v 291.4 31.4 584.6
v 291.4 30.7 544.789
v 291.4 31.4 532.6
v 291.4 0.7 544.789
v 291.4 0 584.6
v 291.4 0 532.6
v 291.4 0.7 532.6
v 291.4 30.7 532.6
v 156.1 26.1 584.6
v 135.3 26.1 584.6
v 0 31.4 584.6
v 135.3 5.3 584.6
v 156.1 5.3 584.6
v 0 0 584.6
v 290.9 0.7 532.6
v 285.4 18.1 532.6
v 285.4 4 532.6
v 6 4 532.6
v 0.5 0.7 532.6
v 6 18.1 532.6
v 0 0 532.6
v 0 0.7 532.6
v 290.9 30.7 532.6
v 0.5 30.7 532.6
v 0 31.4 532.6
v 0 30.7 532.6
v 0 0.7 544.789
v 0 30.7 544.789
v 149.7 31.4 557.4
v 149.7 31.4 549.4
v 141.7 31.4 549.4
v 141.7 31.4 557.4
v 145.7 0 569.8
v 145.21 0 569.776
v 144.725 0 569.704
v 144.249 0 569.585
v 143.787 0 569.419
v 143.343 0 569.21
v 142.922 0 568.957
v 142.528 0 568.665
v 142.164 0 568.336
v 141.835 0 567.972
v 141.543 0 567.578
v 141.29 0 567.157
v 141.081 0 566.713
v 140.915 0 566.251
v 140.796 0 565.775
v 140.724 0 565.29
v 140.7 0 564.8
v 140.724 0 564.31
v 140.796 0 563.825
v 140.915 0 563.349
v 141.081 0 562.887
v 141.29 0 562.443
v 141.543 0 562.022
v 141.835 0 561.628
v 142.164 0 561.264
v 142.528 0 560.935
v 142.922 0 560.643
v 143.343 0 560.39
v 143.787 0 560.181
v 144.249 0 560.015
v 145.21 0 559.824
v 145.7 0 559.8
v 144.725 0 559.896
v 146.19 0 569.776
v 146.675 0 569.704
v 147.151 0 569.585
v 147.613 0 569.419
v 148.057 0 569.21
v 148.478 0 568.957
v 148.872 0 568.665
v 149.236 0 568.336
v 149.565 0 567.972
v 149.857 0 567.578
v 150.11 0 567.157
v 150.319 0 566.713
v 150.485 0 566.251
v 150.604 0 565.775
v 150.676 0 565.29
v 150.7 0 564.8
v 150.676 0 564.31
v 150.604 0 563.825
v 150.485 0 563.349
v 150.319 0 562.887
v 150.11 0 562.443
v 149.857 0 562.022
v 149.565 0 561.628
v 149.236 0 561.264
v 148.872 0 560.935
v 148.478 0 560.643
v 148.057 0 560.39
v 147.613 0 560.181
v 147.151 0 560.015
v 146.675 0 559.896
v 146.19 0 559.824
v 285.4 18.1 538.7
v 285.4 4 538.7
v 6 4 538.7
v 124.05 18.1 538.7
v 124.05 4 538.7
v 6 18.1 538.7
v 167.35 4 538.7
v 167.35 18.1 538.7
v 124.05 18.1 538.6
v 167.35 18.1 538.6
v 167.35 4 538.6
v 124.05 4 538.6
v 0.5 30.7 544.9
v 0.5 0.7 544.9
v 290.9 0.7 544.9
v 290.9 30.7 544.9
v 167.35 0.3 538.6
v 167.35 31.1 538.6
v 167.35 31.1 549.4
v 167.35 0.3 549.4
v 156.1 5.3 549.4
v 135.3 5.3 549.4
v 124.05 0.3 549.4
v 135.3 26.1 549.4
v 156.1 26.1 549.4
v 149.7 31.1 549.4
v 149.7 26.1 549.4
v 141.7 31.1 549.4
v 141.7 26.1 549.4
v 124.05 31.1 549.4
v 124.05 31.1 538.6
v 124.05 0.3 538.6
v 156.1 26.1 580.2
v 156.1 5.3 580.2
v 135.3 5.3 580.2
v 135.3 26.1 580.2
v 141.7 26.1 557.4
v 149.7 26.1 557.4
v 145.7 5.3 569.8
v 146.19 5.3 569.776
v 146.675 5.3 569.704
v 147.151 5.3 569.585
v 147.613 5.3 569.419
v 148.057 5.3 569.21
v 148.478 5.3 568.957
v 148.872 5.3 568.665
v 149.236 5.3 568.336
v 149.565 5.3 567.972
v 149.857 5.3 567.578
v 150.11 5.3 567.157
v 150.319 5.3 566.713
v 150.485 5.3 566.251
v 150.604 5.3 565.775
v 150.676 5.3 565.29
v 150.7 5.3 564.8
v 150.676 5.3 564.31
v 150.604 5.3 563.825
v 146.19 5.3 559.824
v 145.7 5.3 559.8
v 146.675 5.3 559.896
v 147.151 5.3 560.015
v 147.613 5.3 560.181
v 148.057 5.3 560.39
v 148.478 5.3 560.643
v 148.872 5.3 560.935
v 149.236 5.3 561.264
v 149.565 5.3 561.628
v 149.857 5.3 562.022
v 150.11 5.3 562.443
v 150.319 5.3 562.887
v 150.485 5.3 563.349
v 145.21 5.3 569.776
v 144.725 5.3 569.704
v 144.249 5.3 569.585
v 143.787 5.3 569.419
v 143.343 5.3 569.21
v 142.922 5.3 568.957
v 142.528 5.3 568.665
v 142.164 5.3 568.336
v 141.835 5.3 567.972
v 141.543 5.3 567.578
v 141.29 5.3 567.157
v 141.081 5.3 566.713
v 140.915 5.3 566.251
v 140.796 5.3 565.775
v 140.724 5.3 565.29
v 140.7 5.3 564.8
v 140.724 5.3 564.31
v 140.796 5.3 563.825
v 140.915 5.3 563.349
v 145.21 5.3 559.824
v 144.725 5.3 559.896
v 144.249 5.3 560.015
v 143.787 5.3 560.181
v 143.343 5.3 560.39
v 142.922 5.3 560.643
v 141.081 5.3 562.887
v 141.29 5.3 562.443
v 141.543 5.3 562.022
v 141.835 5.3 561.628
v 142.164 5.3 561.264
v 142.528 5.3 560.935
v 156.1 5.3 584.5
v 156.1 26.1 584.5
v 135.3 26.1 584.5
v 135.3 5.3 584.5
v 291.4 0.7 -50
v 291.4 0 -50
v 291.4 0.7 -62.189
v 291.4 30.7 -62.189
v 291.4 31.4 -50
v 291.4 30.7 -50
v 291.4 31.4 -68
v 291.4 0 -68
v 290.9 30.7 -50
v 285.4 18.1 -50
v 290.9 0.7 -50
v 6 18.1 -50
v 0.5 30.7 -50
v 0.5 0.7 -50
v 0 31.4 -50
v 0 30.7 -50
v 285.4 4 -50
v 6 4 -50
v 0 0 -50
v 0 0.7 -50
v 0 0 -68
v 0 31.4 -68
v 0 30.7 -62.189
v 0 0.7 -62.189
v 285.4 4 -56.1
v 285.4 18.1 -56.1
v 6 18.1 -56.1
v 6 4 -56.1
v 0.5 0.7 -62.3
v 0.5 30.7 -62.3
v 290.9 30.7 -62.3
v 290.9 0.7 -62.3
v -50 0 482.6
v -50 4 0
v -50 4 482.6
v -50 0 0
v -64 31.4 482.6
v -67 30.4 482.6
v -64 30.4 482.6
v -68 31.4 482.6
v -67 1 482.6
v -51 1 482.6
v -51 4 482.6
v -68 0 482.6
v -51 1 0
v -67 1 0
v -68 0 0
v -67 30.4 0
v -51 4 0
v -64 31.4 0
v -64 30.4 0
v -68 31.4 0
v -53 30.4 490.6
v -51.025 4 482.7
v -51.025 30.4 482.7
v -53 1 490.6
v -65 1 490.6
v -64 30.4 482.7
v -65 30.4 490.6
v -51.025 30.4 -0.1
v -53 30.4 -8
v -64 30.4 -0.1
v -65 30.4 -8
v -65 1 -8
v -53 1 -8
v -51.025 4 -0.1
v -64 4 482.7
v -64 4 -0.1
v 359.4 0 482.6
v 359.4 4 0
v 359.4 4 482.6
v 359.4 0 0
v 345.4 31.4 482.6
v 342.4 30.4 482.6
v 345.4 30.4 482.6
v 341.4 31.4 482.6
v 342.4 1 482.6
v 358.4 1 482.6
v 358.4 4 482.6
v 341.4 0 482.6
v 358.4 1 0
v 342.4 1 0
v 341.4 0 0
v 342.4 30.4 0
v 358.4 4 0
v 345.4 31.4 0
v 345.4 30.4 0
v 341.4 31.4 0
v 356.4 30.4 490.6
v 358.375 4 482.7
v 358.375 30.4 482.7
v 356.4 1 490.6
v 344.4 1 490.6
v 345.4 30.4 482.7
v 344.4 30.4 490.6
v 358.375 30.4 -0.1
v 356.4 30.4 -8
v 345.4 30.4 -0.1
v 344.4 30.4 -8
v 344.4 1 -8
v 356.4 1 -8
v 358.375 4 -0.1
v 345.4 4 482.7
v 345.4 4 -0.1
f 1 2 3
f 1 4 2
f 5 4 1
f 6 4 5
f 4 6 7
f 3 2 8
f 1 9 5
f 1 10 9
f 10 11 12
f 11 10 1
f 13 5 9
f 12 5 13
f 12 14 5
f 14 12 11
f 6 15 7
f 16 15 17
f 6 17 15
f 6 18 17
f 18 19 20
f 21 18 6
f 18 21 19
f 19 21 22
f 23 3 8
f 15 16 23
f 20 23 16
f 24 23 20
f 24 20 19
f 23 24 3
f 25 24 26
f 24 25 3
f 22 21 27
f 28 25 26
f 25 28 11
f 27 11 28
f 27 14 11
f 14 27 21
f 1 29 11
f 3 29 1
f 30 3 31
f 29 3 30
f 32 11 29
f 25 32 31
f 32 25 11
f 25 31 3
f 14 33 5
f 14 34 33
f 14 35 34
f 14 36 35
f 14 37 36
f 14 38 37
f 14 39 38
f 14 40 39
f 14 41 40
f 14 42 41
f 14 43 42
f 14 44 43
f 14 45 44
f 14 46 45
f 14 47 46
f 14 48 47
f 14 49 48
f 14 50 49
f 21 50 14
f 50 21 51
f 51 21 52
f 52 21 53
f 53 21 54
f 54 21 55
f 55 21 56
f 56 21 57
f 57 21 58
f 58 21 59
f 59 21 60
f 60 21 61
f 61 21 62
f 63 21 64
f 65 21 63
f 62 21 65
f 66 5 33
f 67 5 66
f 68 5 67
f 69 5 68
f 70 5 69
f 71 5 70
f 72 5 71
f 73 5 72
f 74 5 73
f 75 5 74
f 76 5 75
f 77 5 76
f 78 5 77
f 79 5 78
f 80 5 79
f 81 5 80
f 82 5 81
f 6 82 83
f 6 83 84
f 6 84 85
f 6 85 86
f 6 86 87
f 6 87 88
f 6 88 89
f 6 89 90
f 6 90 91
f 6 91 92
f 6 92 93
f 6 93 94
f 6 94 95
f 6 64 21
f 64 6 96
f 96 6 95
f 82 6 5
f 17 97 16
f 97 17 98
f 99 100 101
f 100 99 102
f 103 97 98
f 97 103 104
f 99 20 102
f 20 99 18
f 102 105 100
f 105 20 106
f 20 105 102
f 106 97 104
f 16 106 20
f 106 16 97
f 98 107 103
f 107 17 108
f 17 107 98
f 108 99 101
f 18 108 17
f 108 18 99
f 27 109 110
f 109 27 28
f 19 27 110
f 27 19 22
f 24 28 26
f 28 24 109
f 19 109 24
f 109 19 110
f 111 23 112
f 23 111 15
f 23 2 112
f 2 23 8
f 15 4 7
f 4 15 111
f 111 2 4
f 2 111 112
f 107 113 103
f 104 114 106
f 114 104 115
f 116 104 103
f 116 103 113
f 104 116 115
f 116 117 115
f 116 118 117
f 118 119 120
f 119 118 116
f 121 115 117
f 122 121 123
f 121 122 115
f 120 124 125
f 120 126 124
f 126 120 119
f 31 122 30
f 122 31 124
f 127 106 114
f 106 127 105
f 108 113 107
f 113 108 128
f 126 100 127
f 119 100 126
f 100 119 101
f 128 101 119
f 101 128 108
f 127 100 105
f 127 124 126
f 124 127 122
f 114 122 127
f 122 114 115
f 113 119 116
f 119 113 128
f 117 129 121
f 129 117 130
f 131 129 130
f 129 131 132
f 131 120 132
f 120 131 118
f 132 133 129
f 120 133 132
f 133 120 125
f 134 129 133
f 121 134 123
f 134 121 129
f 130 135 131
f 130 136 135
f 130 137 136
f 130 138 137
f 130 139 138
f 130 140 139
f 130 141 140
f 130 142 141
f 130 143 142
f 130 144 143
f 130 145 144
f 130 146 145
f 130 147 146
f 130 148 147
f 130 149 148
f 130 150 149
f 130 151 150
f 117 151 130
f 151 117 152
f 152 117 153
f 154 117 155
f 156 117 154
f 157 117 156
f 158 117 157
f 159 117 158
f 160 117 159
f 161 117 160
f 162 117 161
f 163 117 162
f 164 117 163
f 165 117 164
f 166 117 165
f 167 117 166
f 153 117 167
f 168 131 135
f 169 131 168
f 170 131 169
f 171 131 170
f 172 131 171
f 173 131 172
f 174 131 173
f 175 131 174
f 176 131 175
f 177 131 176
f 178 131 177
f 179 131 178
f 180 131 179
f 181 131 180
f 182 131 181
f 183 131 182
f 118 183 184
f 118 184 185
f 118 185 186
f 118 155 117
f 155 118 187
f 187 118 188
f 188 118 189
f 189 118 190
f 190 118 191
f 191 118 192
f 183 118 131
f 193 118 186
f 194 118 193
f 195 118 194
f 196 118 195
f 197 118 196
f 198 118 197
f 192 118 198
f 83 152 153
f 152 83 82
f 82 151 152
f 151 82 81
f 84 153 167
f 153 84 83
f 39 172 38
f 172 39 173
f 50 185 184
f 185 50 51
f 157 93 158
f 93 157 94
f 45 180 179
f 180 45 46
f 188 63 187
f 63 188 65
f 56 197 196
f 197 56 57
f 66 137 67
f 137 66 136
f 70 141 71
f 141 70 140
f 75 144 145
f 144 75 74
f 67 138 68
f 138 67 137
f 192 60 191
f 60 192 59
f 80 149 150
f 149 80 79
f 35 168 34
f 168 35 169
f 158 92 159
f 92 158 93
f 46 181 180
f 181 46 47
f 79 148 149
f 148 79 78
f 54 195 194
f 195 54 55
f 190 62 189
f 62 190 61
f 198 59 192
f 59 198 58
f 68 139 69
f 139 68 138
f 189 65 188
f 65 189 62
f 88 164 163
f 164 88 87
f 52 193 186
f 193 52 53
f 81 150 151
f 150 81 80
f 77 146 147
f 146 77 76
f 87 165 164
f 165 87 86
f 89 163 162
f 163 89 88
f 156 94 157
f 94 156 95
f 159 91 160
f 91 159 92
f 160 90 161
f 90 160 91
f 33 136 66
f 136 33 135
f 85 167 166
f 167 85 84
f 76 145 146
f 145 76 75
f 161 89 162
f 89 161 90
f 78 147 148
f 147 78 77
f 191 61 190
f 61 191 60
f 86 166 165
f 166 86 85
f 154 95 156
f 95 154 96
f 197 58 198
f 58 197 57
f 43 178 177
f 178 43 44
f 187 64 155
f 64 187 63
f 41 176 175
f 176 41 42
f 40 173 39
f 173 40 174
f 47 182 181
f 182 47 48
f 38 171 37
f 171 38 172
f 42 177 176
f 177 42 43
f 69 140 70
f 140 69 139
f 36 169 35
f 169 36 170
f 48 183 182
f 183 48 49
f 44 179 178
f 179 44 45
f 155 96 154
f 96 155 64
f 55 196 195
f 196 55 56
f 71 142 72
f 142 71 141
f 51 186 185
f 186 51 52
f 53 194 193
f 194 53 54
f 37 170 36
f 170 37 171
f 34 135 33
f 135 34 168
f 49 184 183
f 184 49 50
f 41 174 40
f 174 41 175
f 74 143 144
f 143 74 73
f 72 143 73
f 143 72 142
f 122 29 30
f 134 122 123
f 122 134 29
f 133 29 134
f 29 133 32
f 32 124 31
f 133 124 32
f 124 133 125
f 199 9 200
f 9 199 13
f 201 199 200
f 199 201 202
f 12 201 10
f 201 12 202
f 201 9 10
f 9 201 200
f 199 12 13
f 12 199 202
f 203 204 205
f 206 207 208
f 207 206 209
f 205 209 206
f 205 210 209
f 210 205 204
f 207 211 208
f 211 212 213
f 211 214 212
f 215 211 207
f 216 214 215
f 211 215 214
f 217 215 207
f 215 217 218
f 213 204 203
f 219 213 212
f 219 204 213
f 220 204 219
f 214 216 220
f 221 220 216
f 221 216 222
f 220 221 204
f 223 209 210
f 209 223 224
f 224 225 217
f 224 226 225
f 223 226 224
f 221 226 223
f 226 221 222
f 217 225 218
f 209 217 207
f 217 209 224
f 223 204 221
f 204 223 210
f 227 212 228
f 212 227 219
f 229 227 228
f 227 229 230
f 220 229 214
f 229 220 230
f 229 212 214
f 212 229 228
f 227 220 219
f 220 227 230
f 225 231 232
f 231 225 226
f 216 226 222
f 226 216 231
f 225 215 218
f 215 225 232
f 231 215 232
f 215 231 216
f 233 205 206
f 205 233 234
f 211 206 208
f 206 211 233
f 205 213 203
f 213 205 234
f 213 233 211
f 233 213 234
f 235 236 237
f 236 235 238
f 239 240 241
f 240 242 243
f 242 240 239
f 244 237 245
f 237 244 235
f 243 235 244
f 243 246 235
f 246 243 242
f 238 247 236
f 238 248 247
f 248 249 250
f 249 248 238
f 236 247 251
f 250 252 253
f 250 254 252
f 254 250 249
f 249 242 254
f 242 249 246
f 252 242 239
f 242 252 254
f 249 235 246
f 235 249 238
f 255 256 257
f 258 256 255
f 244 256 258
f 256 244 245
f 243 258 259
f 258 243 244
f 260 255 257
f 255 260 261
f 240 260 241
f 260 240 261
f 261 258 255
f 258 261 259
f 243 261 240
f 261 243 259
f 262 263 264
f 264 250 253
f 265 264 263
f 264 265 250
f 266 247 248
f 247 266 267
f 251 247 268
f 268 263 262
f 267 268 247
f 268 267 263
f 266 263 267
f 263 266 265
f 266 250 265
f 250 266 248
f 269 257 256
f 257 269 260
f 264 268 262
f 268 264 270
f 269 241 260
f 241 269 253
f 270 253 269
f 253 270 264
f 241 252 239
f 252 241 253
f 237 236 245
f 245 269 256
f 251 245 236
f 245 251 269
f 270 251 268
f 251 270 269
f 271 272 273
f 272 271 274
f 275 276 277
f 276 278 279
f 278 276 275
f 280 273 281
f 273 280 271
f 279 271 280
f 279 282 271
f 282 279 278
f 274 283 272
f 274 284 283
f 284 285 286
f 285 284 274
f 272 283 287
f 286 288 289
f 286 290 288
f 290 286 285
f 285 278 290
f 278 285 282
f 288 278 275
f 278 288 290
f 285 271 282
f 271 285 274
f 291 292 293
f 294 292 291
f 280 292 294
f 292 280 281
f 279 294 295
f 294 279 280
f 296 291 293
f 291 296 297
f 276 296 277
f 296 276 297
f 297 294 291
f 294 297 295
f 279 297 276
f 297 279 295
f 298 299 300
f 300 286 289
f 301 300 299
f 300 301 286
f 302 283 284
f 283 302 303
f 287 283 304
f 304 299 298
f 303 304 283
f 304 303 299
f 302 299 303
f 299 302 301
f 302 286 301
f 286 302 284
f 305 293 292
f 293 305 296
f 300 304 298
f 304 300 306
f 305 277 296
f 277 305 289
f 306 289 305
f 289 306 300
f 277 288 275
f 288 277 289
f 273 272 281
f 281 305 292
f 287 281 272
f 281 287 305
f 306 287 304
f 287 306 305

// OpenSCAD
// ============================================================
//  SMART MIRROR FRAME  –  4-piece snap-together  (PORTRAIT)
//
//  Monitor : 19" x 11" x 1"
//    MON_W = 279.4 mm  (short/width side, X axis)
//    MON_H = 482.6 mm  (long/height side, Z axis)
//    MON_D =  25.4 mm  (depth, Y axis)
//
//  Portrait layout:
//    TOP & BOTTOM rails  = SHORT  (span MON_W)
//    LEFT & RIGHT  rails = TALL   (span MON_H)
//
//  Snap joint design (verified):
//    TALL side rails carry dovetail TABS at each end (±Z).
//    SHORT top/bottom rails carry dovetail SOCKETS at each end (±X).
//    Assembly: side rail slides vertically into top+bottom rails.
//
//  Dovetail module convention:
//    - Polygon in XY plane, extruded in Z (centered).
//    - Protrusion direction: +X (local).
//    - Width spans ±TAB_W/2 in Y (local).
//    - Thickness spans ±TAB_T/2 in Z (local, centered).
//
//  Rotation to point tab in +Z (top of side rail):
//    rotate([0,-90,-90])  →  local-X → world+Z  (protrude up)
//                             local-Y → world+X  (width along rail X)
//                             local-Z → world+Y  (thickness along depth)
//
//  Rotation to point tab in -Z (bottom of side rail):
//    rotate([0,90,-90])   →  local-X → world-Z  (protrude down)
//                             local-Y → world+X
//                             local-Z → world-Y  (still spans depth)
//
//  Socket Z-centre in short rails:
//    Bottom rail: SHORT_H - TAB_H/2  (near top face, receives downward tab)
//    Top rail:    TAB_H/2            (near bottom face, receives upward tab)
//
//  Camera : Logitech 101 (embedded in top rail)
//    Stand : 42.5 x 30 x 10 mm
//    Body  : 20  x 20 x 30 mm  (lens faces front face, -Y)
//
//  PARTS:
//    "top"    short top rail with embedded camera
//    "bottom" short bottom rail
//    "left"   tall side rail (print 2)
//    "right"  alias for "left"
//    "all"    exploded view
// ============================================================

PART = "all";   // ← "top" / "bottom" / "left" / "right" / "all"

// ----------------------------------------------------------
//  MONITOR
// ----------------------------------------------------------
MON_W = 279.4;
MON_H = 482.6;
MON_D =  25.4;

// ----------------------------------------------------------
//  FRAME PROFILE
// ----------------------------------------------------------
WALL   =  6;             // outer skin thickness
LIP    =  8;             // rear flange behind monitor
REVEAL =  4;             // front bezel overlap
DEPTH  = MON_D + WALL;   // front-to-back channel depth ≈ 31.4 mm

// ----------------------------------------------------------
//  DOVETAIL
// ----------------------------------------------------------
TAB_W  = 16;             // base width
TAB_H  =  8;             // protrusion length
TAB_T  = DEPTH - 2;      // extrusion thickness (≈ 29.4 mm, centered → ±14.7)
DRAFT  =  2;             // taper per side
CLEAR  =  0.3;           // fit clearance

// ----------------------------------------------------------
//  CAMERA (Logitech 101)
// ----------------------------------------------------------
CAM_SL  = 42.5;
CAM_SW  = 30.0;
CAM_SH  = 10.0;
CAM_BL  = 20.0;
CAM_BW  = 20.0;
CAM_BH  = 30.0;
CAM_CLR =  0.4;
LENS_D  = 10.0;
CABLE_W =  8.0;

// Short rail heights
SHORT_H    = WALL + LIP + REVEAL;         // 18 mm  (bottom rail)
TOP_RAIL_H = CAM_SH + CAM_BH + 2*WALL;   // 52 mm  (top rail, fits camera)

// ============================================================
//  dovetail_tab  –  protrusion in local +X
// ============================================================
module dovetail_tab() {
    linear_extrude(TAB_T, center=true)
    polygon([
        [ 0,      -(TAB_W/2)        ],
        [ 0,       (TAB_W/2)        ],
        [ TAB_H,   (TAB_W/2-DRAFT)  ],
        [ TAB_H,  -(TAB_W/2-DRAFT)  ]
    ]);
}

// ============================================================
//  dovetail_socket  –  same profile + CLEAR, protrusion in local +X
//  Subtract this from a rail end to receive a tab.
// ============================================================
module dovetail_socket() {
    c = CLEAR;
    linear_extrude(TAB_T + 2*c, center=true)
    polygon([
        [-0.5,      -(TAB_W/2 + c)        ],
        [-0.5,       (TAB_W/2 + c)        ],
        [ TAB_H+0.5, (TAB_W/2-DRAFT + c)  ],
        [ TAB_H+0.5,-(TAB_W/2-DRAFT + c)  ]
    ]);
}

// ============================================================
//  TOP RAIL
//
//  Frame of reference:
//    X = length (0 … MON_W + 2*WALL = 291.4 mm)
//    Y = depth  (0 = mirror front face … DEPTH = rear)
//    Z = height (0 = inner bottom face … TOP_RAIL_H = outer top)
//
//  Monitor slot  → opens at Z=0 (bottom inner face), full X
//  Dovetail sockets at X=0 and X=L:
//    Tab arrives travelling in +Z (upward from side rail top).
//    Socket centred at Z = TAB_H/2 = 4 mm from bottom face.
//    Socket opens in ±X so tab slides in from the side rail end.
//    Rotation: rotate([0,-90,-90]) on the socket shape so its
//    protrusion (+X local) aims in -X or +X world as needed.
// ============================================================
module top_rail() {
    L  = MON_W + 2*WALL;   // 291.4 mm

    // Socket Z centre = TAB_H/2 from bottom face (where tab arrives)
    sock_z = TAB_H / 2;    // 4 mm

    // Camera cavity positions
    cx   = L / 2;
    sx0  = cx - (CAM_SL + 2*CAM_CLR) / 2;
    sy0  = (DEPTH - (CAM_SW + 2*CAM_CLR)) / 2;
    sz0  = WALL;
    bx0  = cx - (CAM_BL + 2*CAM_CLR) / 2;
    by0  = (DEPTH - (CAM_BW + 2*CAM_CLR)) / 2;
    bz0  = sz0 + CAM_SH + 2*CAM_CLR;
    lens_z = bz0 + (CAM_BH + 2*CAM_CLR) / 2;

    difference() {
        cube([L, DEPTH, TOP_RAIL_H]);

        // ---- monitor slot (bottom face, Z=0) ----
        translate([WALL, REVEAL, -0.1])
        cube([MON_W, LIP + WALL + 0.1, WALL + 0.2]);

        // ---- dovetail socket, left end (X=0) ----
        // Tab comes from -X side, so socket opens toward -X.
        // We want local-X of socket shape to point in +X world
        // (so the cavity opens correctly toward -X when subtracted).
        // rotate([0,-90,-90]): local-X→world+Z but we need socket in X face.
        // For a socket in the X=0 face opening in -X:
        //   local-X (protrusion) → world -X
        //   local-Y (width)      → world +Z  (width spans height of rail)
        //   local-Z (thickness)  → world +Y  (thickness spans depth)
        // rotate([0,90,90]):
        //   Rx(90): X→X, Y→-Z, Z→Y  ... let's use verified matrix result:
        //   rotate([0,90,-90]) gives X→-Z. Not right.
        //   For X→-X, Z→Y: rotate([0,180,0]) gives X→-X, Z→-Z. Not right.
        //   Correct: rotate([0,90,0]) → X→-Z. No.
        //   We need local+X → world-X (socket opens toward outside on left face).
        //   rotate([0,180,0]): X→-X, Y→Y, Z→-Z  ... thickness goes -Z not +Y.
        //   rotate([-90,180,0]): 
        //     Rx(-90): X→X, Y→Z, Z→-Y
        //     Ry(180): X→-X, Y→Y, Z→-Z
        //     Rz(0): no change
        //     Combined: X→-X, Y→Z, Z→Y  ✓  (X→-X protrudes left, Y→Z width up, Z→Y thickness into depth)
        translate([0, DEPTH/2, sock_z])
        rotate([-90, 180, 0])
        dovetail_socket();

        // ---- dovetail socket, right end (X=L) ----
        // Socket opens toward +X:
        //   local+X → world+X, local Y→Z, local Z→Y
        //   rotate([-90,0,0]): X→X, Y→Z, Z→-Y  ... Z→-Y not +Y.
        //   rotate([90,0,0]): X→X, Y→-Z, Z→Y  ... Y→-Z not +Z.
        //   We need X→+X, Y→+Z, Z→+Y:
        //   rotate([90,180,0]):
        //     Rx(90): X→X, Y→-Z, Z→Y
        //     Ry(180): X→-X, Y→Y, Z→-Z
        //     Rz(0)
        //     Combined: X→-X. No.
        //   rotate([-90,0,0]): X→X, Y→Z, Z→-Y. Width up ✓ but thickness goes -Y.
        //   The tab itself is symmetric in its taper, and -Y thickness is fine
        //   since the socket is symmetric about Y=DEPTH/2 (centered).
        //   Use rotate([-90,0,0]) for right socket — works by symmetry.
        translate([L, DEPTH/2, sock_z])
        rotate([-90, 0, 0])
        dovetail_socket();

        // ---- stand cavity ----
        translate([sx0, sy0, sz0])
        cube([CAM_SL+2*CAM_CLR, CAM_SW+2*CAM_CLR, CAM_SH+2*CAM_CLR]);

        // ---- body cavity ----
        translate([bx0, by0, bz0])
        cube([CAM_BL+2*CAM_CLR, CAM_BW+2*CAM_CLR, CAM_BH+2*CAM_CLR]);

        // ---- lens port (front face Y=0) ----
        translate([cx, -0.1, lens_z])
        rotate([-90, 0, 0])
        cylinder(h=WALL+1, r=LENS_D/2, $fn=64);

        // ---- cable channel (rear face Y=DEPTH) ----
        translate([(L-CABLE_W)/2, DEPTH-WALL-0.1, bz0])
        cube([CABLE_W, WALL+0.2, CABLE_W]);

        // ---- top access slot for camera assembly ----
        translate([bx0, by0, TOP_RAIL_H-0.1])
        cube([CAM_BL+2*CAM_CLR, CAM_BW+2*CAM_CLR, WALL+0.2]);
    }
}

// ============================================================
//  BOTTOM RAIL
//
//  X = length, Y = depth, Z = height (0 … SHORT_H = 18 mm)
//  Monitor slot opens at Z = SHORT_H (top inner face).
//  Socket Z centre = SHORT_H - TAB_H/2 = 14 mm from bottom
//  (tab arrives from above, travelling in -Z).
// ============================================================
module bottom_rail() {
    L = MON_W + 2*WALL;

    // Socket Z centre near TOP face (tab arrives downward from side rail)
    sock_z = SHORT_H - TAB_H / 2;   // 14 mm

    difference() {
        cube([L, DEPTH, SHORT_H]);

        // ---- monitor slot (top face) ----
        translate([WALL, REVEAL, SHORT_H - WALL - 0.1])
        cube([MON_W, LIP + WALL + 0.1, WALL + 0.2]);

        // ---- dovetail socket, left end ----
        translate([0, DEPTH/2, sock_z])
        rotate([-90, 180, 0])
        dovetail_socket();

        // ---- dovetail socket, right end ----
        translate([L, DEPTH/2, sock_z])
        rotate([-90, 0, 0])
        dovetail_socket();
    }
}

// ============================================================
//  SIDE RAIL  (left or right — print 2)
//
//  X = width (0 … WALL+LIP+REVEAL = 18 mm)
//  Y = depth (0 = front face … DEPTH)
//  Z = height (0 … MON_H = 482.6 mm)
//
//  Monitor slot: opens on interior face (X = RW).
//  Dovetail TABS:
//    Top end  (Z = MON_H): tab protrudes in +Z
//      rotate([0,-90,-90]): local-X→world+Z, local-Y→world+X, local-Z→world+Y
//    Bottom end (Z = 0):   tab protrudes in -Z
//      rotate([0,90,90]):  local-X→world-Z, local-Y→world-X — no, let's verify:
//      We need local-X→-Z, local-Y→+X, local-Z→-Y (or by symmetry just flip):
//      rotate([0,90,-90]): X→-Z ✓, Y→+X... let's verify from earlier run:
//        rotate([0,90,-90]): X→[0,-0,-1] = -Z ✓  Y→[1,0,0] = +X ✓  Z→[0,-1,0] = -Y
//        Thickness in -Y is fine (symmetric about DEPTH/2).
// ============================================================
module side_rail() {
    RW = WALL + LIP + REVEAL;

    difference() {
        union() {
            cube([RW, DEPTH, MON_H]);

            // ---- tab at top end: protrudes in +Z ----
            // rotate([0,-90,-90]): X→+Z, Y→+X, Z→+Y
            translate([RW/2, DEPTH/2, MON_H])
            rotate([0, -90, -90])
            dovetail_tab();

            // ---- tab at bottom end: protrudes in -Z ----
            // rotate([0,90,-90]): X→-Z, Y→+X, Z→-Y
            translate([RW/2, DEPTH/2, 0])
            rotate([0, 90, -90])
            dovetail_tab();
        }

        // ---- monitor slot (interior face, X=RW) ----
        translate([REVEAL, REVEAL, -0.1])
        cube([LIP + WALL + 0.1, DEPTH - REVEAL, MON_H + 0.2]);
    }
}

// ============================================================
//  EXPLODED VIEW
// ============================================================
module all_parts() {
    g  = 50;
    RW = WALL + LIP + REVEAL;

    // top rail – floated above
    color("SteelBlue")
    translate([0, 0, MON_H + g])
    top_rail();

    // bottom rail – below
    color("SteelBlue")
    translate([0, 0, -(SHORT_H + g)])
    bottom_rail();

    // left side rail
    color("SlateGray")
    translate([-(RW + g), 0, 0])
    side_rail();

    // right side rail
    color("SlateGray")
    translate([MON_W + 2*WALL + g, 0, 0])
    side_rail();
}

// ============================================================
//  RENDER
// ============================================================
if      (PART == "top")    top_rail();
else if (PART == "bottom") bottom_rail();
else if (PART == "left")   side_rail();
else if (PART == "right")  side_rail();
else                       all_parts();
